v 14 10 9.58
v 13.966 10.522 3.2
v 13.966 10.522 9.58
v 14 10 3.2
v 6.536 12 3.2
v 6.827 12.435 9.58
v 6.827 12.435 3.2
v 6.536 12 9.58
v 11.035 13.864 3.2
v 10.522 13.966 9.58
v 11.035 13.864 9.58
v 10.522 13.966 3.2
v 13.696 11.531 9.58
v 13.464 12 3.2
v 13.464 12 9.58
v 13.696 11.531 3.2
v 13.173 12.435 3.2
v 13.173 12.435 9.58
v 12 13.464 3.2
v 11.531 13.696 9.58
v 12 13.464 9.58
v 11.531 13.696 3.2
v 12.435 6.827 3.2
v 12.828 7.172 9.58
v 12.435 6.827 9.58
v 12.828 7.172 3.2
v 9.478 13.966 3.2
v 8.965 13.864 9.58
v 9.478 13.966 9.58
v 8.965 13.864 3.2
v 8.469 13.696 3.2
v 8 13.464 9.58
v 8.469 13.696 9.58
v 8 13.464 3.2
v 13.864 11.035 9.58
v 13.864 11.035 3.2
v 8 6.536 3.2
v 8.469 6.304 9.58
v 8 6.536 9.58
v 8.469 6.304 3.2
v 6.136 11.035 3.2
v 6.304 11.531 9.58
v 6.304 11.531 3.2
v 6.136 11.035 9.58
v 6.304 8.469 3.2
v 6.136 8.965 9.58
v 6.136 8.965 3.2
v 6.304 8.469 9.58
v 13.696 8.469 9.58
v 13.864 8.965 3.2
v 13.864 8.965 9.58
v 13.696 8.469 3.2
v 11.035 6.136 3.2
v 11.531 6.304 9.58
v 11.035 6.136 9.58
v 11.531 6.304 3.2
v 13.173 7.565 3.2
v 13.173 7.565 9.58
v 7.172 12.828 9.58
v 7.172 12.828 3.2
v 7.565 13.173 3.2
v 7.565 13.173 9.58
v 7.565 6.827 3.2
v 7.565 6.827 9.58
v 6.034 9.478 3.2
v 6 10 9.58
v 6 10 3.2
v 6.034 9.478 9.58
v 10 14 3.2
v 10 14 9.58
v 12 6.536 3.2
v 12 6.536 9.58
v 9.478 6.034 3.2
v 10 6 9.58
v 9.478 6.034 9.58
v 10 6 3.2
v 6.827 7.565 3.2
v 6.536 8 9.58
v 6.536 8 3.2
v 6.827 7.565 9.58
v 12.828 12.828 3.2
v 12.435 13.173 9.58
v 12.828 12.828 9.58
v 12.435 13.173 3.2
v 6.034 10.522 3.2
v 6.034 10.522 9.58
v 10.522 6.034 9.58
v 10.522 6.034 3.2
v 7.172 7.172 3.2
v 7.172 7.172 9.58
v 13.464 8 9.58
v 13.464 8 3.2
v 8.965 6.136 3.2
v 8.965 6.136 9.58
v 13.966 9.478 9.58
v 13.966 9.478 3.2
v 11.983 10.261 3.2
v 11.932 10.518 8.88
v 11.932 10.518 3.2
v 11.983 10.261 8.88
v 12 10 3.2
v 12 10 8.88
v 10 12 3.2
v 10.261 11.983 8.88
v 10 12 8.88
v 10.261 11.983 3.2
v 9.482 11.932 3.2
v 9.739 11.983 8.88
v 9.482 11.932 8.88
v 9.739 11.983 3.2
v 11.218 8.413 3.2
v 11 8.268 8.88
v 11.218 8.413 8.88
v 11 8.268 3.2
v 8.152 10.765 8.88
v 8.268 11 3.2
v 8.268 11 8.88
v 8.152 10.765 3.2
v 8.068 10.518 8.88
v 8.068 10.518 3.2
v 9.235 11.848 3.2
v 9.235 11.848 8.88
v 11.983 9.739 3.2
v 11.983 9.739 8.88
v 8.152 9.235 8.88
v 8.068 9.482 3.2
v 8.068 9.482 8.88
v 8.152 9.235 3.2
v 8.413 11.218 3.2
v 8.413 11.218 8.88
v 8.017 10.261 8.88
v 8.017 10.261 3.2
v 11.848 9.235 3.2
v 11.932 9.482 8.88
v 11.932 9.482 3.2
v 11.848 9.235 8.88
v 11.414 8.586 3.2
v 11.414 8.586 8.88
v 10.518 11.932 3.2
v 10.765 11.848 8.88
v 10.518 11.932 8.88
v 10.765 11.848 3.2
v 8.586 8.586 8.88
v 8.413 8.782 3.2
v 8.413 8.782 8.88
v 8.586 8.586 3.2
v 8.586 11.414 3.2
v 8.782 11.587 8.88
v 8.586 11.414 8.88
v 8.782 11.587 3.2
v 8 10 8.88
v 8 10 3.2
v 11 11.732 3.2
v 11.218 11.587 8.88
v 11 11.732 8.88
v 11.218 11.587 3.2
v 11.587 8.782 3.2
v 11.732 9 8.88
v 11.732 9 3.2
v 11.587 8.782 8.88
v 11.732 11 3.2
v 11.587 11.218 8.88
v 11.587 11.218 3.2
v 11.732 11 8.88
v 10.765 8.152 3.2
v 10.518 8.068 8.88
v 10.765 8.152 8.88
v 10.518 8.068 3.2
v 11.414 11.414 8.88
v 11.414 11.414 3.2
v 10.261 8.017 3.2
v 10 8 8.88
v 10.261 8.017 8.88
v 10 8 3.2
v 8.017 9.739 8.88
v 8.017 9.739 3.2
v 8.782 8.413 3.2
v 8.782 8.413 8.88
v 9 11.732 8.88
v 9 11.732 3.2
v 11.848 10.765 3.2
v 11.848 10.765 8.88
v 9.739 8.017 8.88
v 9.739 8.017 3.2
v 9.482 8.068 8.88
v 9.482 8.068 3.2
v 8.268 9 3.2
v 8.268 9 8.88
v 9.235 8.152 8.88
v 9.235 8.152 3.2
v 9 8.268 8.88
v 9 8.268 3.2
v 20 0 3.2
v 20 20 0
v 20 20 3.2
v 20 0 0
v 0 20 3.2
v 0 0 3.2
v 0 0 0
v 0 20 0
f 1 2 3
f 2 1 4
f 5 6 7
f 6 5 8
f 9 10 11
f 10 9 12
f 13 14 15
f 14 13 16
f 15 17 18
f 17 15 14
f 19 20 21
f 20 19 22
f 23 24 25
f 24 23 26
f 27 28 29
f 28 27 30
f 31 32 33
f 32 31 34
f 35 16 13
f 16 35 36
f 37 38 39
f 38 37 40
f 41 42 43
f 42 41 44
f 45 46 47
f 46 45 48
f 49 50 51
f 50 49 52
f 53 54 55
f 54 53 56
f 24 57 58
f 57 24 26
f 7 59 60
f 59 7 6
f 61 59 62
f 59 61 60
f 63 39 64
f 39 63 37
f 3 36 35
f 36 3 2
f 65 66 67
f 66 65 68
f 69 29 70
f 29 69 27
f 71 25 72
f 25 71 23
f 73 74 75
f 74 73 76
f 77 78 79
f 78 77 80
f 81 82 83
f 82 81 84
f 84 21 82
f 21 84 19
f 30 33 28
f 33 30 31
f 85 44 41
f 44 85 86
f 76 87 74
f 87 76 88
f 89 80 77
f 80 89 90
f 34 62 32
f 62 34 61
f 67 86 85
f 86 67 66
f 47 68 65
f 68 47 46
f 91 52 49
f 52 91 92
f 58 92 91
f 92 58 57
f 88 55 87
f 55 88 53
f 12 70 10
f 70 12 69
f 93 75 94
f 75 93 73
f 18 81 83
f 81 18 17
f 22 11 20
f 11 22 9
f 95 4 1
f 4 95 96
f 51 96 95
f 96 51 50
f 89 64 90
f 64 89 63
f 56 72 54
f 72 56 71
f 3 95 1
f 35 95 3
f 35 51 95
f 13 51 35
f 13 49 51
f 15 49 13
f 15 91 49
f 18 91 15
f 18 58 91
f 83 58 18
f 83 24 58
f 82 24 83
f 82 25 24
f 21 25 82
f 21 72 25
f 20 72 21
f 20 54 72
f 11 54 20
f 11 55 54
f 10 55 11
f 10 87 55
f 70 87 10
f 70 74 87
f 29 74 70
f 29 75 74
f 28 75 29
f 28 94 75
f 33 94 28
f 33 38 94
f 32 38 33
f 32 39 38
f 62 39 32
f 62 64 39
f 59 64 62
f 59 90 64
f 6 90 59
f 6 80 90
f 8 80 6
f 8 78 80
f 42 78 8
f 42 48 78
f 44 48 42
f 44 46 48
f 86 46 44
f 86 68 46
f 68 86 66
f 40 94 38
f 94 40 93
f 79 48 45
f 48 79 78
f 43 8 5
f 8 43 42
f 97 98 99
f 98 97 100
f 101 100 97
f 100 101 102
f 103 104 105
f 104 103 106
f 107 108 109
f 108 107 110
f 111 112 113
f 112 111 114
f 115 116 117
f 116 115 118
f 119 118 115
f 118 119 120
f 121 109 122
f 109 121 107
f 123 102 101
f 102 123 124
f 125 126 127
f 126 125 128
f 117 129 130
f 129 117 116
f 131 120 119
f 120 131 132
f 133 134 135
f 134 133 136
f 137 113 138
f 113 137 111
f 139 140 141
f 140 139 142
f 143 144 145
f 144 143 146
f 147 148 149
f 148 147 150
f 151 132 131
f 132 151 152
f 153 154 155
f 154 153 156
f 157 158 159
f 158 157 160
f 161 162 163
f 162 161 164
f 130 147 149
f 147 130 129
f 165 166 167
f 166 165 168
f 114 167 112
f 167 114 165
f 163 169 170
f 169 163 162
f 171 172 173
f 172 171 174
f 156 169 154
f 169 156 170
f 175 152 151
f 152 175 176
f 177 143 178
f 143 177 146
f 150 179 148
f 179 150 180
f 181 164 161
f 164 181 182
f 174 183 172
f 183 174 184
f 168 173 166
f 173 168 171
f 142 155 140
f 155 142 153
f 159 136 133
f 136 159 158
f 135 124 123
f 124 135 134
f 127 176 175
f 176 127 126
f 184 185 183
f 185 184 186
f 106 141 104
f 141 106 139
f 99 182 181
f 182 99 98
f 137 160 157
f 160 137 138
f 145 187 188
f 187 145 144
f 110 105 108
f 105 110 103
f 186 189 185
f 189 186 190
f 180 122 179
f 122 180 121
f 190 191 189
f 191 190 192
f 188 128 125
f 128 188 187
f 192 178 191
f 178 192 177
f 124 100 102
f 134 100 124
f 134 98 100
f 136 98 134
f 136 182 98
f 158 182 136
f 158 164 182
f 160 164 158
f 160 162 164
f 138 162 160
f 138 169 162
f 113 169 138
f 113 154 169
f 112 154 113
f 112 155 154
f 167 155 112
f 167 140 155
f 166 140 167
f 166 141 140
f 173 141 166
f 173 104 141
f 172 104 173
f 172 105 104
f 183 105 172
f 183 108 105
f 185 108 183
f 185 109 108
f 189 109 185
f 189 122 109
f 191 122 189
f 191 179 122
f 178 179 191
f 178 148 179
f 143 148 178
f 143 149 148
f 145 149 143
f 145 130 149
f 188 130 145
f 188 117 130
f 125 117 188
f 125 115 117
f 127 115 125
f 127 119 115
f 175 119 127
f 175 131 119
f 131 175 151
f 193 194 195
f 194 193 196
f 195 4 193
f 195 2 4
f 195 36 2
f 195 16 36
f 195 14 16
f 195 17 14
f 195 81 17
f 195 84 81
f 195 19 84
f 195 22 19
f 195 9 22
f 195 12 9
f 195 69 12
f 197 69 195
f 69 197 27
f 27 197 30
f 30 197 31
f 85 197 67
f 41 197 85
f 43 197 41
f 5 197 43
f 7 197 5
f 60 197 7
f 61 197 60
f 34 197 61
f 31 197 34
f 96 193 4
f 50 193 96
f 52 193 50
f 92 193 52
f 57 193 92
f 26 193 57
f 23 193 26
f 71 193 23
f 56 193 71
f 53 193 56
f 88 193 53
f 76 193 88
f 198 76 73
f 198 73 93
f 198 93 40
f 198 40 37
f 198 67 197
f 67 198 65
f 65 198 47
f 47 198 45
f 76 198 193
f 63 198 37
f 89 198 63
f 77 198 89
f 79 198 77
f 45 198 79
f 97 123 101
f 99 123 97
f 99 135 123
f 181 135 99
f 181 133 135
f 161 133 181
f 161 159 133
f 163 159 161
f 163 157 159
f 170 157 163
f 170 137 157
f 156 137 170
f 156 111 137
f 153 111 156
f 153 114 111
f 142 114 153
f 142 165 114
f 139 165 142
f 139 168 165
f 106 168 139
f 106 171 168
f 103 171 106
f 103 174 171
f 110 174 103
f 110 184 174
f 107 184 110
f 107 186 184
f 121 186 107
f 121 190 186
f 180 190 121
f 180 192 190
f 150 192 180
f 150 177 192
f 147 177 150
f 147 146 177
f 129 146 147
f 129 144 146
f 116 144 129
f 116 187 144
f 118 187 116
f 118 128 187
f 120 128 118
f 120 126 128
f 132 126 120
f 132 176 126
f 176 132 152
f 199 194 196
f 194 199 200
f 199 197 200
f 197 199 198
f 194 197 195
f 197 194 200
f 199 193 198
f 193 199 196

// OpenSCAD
// Heat-set insert coupon — millimetres. expected_shells = 1.
// Provenance: references/heat-set-inserts-fdm.md (datasheet).

insert_od_mm = 4.6;
insert_hole_d_mm = 4.0;
insert_depth_mm = 5.7;
boss_od_mm = 8.0;
boss_h_mm = 6.4;
coupon_xy_mm = 20;
coupon_z_mm = 3.2;
$fn = 48;
eps = 0.02;

module insert_boss() {
  difference() {
    cylinder(d = boss_od_mm, h = boss_h_mm);
    translate([0, 0, -eps])
      cylinder(d = insert_hole_d_mm, h = insert_depth_mm + eps);
  }
}

union() {
  cube([coupon_xy_mm, coupon_xy_mm, coupon_z_mm]);
  translate([coupon_xy_mm / 2, coupon_xy_mm / 2, coupon_z_mm - eps])
    insert_boss();
}
